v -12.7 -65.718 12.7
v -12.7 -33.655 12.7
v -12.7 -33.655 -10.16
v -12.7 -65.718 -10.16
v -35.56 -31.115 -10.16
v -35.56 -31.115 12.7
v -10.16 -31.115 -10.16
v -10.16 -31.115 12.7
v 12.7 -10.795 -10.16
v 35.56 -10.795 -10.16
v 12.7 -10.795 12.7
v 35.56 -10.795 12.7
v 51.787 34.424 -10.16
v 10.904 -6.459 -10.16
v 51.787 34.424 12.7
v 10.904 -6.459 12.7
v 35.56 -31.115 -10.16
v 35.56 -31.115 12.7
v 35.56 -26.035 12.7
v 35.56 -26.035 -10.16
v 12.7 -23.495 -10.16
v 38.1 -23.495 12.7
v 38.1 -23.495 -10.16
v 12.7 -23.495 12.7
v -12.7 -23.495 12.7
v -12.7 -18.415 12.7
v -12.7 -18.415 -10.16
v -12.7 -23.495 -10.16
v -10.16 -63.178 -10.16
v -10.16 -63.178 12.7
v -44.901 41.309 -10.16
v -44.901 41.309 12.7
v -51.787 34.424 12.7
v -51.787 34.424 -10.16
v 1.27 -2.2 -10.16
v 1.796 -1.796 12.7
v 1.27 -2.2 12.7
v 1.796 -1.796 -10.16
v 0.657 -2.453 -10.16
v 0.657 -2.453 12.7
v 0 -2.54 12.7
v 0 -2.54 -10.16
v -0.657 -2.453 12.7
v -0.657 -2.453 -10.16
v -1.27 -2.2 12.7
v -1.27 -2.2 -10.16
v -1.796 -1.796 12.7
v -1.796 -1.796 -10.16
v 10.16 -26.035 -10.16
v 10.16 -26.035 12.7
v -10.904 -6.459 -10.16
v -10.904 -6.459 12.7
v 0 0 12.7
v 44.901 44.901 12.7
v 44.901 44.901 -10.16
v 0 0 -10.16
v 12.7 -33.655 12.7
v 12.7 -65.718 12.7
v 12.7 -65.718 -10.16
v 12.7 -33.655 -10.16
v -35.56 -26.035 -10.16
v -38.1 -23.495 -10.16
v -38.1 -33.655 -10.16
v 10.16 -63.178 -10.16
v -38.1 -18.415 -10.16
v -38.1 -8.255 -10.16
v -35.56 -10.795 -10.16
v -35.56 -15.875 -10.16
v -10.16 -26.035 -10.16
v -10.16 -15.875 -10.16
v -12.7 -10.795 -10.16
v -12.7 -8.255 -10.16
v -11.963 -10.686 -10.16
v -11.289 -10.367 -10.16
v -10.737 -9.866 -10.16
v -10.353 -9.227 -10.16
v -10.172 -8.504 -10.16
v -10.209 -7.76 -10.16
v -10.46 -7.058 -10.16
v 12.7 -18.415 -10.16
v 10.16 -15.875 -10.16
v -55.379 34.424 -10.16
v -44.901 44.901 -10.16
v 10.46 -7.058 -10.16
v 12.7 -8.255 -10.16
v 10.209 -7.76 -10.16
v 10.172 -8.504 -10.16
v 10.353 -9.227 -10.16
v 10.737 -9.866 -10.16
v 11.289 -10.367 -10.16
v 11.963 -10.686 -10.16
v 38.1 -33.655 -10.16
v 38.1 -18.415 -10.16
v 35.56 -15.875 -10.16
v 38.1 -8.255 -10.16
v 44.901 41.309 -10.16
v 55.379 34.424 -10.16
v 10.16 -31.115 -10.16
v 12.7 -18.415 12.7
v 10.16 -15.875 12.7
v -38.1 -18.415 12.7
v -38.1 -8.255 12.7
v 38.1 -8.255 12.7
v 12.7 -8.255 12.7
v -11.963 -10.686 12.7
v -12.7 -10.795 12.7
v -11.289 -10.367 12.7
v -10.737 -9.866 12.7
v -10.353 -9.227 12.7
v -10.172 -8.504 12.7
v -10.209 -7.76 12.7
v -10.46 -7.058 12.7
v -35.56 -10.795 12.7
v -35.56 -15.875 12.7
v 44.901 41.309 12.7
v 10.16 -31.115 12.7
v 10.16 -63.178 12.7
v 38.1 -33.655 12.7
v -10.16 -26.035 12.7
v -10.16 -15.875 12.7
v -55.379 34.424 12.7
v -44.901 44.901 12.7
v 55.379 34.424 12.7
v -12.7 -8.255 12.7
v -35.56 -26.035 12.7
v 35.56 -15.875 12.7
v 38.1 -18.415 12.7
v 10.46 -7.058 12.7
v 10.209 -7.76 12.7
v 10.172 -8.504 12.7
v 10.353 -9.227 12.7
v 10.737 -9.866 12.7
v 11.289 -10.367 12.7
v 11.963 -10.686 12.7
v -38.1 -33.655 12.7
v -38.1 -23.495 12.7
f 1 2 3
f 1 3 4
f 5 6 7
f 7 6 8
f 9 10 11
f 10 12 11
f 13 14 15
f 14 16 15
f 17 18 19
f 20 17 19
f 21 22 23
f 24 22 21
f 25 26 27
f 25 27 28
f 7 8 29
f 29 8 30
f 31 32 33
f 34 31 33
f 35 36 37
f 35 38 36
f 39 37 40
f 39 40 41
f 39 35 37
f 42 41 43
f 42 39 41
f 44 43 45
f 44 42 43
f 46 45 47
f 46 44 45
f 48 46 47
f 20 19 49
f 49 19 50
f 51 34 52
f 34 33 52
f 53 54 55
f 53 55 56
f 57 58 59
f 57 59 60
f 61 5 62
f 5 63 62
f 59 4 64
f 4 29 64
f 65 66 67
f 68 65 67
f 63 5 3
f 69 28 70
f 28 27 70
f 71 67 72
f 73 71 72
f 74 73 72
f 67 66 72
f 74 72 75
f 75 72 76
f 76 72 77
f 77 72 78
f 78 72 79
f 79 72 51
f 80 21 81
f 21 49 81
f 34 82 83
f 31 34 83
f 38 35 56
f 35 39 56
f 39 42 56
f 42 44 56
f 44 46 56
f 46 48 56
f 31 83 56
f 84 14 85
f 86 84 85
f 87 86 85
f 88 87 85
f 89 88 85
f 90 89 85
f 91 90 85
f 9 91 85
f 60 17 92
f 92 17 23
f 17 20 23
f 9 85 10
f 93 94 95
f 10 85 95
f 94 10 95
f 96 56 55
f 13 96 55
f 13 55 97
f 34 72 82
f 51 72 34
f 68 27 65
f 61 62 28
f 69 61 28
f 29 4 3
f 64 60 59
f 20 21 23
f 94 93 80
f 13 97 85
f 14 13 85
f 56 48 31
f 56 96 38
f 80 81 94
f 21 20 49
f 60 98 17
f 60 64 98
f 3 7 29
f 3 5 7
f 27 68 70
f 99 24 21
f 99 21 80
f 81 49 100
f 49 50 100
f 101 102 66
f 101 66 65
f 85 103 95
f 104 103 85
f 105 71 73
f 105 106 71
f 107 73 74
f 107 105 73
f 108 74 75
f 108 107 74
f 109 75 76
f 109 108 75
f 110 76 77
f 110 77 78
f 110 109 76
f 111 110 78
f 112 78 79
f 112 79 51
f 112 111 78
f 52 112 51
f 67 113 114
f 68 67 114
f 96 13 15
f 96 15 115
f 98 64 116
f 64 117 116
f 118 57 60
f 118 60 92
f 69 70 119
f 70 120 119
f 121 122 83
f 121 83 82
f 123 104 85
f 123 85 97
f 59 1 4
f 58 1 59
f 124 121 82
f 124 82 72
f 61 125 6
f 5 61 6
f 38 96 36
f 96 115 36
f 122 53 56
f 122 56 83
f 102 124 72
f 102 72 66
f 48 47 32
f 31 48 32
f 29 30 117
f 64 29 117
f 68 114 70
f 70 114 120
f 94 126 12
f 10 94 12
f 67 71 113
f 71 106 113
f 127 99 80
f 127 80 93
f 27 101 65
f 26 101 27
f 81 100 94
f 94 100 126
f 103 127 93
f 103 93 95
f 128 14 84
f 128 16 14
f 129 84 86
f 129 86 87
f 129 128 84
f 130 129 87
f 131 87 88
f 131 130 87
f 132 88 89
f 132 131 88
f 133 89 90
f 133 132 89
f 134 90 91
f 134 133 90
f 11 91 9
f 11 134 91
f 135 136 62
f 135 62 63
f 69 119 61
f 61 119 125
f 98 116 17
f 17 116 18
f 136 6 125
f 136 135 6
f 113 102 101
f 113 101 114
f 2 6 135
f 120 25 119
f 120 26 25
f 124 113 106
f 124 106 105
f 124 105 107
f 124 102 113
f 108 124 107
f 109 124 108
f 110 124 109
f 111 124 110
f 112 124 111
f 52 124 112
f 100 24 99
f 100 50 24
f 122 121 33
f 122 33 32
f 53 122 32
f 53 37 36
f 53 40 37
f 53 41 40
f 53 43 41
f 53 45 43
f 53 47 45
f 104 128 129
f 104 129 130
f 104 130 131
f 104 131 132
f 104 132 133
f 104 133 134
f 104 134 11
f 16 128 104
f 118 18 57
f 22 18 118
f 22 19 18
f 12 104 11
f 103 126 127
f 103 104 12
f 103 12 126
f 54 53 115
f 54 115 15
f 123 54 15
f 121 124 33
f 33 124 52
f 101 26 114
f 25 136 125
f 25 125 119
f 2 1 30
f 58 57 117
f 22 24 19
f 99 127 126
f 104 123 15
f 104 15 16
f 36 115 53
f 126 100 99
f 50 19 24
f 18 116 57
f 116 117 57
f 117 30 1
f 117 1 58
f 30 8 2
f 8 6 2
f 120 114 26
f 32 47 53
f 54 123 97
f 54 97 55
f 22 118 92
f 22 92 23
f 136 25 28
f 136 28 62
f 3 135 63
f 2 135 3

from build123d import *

# Parameters (mm, degrees)
F1_DEPTH = 12.7
F2_T     = -2.54
F3_DEPTH = 2.54
F4_R     = 2.54


with BuildPart() as f1:
    # F0 (on Top) → F1 (new body, symmetric)
    with BuildSketch(Plane.XY):
        Polygon((44.9012806053, 44.9012806053), (0, 0), (-44.9012806053, 44.9012806053), (-55.3788052983, 34.4237559124), (-12.7, -8.2550493859), (-38.1, -8.2550493859), (-38.1, -18.4150493859), (-12.7, -18.4150493859), (-12.7, -23.4950493859), (-38.1, -23.4950493859), (-38.1, -33.6550493859), (-12.7, -33.6550493859), (-12.7, -65.7183155417), (12.7, -65.7183155417), (12.7, -33.6550493859), (38.1, -33.6550493859), (38.1, -23.4950493859), (12.7, -23.4950493859), (12.7, -18.4150493859), (38.1, -18.4150493859), (38.1, -8.2550493859), (12.7, -8.2550493859), (55.3788052983, 34.4237559124), align=None)
    extrude(amount=F1_DEPTH, both=True)

    # F2
    f2_openings = [f1.faces().sort_by_distance(p)[0] for p in [
        (0, -9.817912, 12.7),
    ]]
    offset(amount=F2_T, openings=f2_openings, kind=Kind.INTERSECTION)

    # F3 (cut): a face of the model
    f3_faces = [f1.faces().sort_by_distance(p)[0] for p in [
        (0, -9.8179115299, -12.7),
    ]]
    extrude(f3_faces, amount=-F3_DEPTH, mode=Mode.SUBTRACT)

    # F4
    f4_edges = [f1.edges().sort_by_distance(p)[0] for p in [
        (-6.567898, -10.795049, 1.27),
        (6.567898, -10.795049, 1.27),
        (0, -3.592102, 1.27),
    ]]
    fillet(f4_edges, radius=F4_R)


solid = f1.part
